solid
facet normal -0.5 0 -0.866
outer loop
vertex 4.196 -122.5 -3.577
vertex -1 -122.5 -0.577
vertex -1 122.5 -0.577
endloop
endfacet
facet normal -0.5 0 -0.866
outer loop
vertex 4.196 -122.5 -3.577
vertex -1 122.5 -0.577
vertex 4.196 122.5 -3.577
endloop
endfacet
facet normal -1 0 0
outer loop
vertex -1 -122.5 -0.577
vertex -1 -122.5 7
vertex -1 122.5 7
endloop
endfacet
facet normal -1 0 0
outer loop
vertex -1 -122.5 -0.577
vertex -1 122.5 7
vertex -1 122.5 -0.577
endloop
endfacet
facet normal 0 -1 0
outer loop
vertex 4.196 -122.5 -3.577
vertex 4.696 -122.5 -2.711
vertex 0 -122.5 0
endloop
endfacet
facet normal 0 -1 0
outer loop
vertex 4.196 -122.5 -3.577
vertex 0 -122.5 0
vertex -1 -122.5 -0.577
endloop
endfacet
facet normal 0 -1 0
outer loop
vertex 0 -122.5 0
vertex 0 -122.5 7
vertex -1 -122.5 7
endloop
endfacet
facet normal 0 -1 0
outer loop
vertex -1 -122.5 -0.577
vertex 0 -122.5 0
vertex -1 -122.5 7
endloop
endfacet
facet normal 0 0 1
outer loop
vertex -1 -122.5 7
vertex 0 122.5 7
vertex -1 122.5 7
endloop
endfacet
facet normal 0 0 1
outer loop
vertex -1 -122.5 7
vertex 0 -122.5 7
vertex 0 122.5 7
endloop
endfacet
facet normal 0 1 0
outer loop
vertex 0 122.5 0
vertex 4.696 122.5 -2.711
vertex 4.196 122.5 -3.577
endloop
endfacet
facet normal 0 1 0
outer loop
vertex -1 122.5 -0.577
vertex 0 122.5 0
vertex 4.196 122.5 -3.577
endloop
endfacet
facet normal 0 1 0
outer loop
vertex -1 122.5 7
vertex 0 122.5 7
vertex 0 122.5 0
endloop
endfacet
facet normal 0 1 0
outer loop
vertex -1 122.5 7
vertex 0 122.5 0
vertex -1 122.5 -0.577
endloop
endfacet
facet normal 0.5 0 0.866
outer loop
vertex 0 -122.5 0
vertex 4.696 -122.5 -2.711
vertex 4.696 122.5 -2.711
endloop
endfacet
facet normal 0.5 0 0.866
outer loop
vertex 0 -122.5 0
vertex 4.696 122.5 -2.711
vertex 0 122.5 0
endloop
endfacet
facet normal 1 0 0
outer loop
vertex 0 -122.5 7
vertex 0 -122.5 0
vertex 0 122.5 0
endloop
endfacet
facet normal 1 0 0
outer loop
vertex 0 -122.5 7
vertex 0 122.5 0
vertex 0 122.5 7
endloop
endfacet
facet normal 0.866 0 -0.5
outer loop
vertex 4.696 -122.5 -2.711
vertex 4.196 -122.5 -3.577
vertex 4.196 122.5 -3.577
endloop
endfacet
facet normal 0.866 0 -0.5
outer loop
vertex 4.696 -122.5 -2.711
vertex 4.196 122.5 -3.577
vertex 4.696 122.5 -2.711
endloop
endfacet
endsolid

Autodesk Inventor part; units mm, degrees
ref_plane "YZ Plane" through (0, 0, 0) normal (1, 0, 0) x (0, 1, 0)
ref_plane "XZ Plane" through (0, 0, 0) normal (0, 1, 0) x (-1, 0, 0)
ref_plane "XY Plane" through (0, 0, 0) normal (0, 0, 1) x (1, 0, 0)
sketch "スケッチ1" plane through (0, 0, 0) normal (0, 1, 0) x (-1, 0, 0)
  line L0 (0, 0) -> (0, 7)
  line L1 (0, 7) -> (1, 7)
  line L2 (1, 7) -> (1, -0.5774)
  line L3 (1, -0.5774) -> (-4.1962, -3.5774)
  line L4 (-4.1962, -3.5774) -> (-4.6962, -2.7113)
  line L5 (-4.6962, -2.7113) -> (0, 0)
  dimension "d0" = 7
  dimension "d1" = 1
  dimension "d2" = 1
  dimension "d5" = 120
  dimension "d6" = 6
extrude "押し出し1" add sketch "スケッチ1" along normal mid plane 245
properties part number "gurnee_top"
